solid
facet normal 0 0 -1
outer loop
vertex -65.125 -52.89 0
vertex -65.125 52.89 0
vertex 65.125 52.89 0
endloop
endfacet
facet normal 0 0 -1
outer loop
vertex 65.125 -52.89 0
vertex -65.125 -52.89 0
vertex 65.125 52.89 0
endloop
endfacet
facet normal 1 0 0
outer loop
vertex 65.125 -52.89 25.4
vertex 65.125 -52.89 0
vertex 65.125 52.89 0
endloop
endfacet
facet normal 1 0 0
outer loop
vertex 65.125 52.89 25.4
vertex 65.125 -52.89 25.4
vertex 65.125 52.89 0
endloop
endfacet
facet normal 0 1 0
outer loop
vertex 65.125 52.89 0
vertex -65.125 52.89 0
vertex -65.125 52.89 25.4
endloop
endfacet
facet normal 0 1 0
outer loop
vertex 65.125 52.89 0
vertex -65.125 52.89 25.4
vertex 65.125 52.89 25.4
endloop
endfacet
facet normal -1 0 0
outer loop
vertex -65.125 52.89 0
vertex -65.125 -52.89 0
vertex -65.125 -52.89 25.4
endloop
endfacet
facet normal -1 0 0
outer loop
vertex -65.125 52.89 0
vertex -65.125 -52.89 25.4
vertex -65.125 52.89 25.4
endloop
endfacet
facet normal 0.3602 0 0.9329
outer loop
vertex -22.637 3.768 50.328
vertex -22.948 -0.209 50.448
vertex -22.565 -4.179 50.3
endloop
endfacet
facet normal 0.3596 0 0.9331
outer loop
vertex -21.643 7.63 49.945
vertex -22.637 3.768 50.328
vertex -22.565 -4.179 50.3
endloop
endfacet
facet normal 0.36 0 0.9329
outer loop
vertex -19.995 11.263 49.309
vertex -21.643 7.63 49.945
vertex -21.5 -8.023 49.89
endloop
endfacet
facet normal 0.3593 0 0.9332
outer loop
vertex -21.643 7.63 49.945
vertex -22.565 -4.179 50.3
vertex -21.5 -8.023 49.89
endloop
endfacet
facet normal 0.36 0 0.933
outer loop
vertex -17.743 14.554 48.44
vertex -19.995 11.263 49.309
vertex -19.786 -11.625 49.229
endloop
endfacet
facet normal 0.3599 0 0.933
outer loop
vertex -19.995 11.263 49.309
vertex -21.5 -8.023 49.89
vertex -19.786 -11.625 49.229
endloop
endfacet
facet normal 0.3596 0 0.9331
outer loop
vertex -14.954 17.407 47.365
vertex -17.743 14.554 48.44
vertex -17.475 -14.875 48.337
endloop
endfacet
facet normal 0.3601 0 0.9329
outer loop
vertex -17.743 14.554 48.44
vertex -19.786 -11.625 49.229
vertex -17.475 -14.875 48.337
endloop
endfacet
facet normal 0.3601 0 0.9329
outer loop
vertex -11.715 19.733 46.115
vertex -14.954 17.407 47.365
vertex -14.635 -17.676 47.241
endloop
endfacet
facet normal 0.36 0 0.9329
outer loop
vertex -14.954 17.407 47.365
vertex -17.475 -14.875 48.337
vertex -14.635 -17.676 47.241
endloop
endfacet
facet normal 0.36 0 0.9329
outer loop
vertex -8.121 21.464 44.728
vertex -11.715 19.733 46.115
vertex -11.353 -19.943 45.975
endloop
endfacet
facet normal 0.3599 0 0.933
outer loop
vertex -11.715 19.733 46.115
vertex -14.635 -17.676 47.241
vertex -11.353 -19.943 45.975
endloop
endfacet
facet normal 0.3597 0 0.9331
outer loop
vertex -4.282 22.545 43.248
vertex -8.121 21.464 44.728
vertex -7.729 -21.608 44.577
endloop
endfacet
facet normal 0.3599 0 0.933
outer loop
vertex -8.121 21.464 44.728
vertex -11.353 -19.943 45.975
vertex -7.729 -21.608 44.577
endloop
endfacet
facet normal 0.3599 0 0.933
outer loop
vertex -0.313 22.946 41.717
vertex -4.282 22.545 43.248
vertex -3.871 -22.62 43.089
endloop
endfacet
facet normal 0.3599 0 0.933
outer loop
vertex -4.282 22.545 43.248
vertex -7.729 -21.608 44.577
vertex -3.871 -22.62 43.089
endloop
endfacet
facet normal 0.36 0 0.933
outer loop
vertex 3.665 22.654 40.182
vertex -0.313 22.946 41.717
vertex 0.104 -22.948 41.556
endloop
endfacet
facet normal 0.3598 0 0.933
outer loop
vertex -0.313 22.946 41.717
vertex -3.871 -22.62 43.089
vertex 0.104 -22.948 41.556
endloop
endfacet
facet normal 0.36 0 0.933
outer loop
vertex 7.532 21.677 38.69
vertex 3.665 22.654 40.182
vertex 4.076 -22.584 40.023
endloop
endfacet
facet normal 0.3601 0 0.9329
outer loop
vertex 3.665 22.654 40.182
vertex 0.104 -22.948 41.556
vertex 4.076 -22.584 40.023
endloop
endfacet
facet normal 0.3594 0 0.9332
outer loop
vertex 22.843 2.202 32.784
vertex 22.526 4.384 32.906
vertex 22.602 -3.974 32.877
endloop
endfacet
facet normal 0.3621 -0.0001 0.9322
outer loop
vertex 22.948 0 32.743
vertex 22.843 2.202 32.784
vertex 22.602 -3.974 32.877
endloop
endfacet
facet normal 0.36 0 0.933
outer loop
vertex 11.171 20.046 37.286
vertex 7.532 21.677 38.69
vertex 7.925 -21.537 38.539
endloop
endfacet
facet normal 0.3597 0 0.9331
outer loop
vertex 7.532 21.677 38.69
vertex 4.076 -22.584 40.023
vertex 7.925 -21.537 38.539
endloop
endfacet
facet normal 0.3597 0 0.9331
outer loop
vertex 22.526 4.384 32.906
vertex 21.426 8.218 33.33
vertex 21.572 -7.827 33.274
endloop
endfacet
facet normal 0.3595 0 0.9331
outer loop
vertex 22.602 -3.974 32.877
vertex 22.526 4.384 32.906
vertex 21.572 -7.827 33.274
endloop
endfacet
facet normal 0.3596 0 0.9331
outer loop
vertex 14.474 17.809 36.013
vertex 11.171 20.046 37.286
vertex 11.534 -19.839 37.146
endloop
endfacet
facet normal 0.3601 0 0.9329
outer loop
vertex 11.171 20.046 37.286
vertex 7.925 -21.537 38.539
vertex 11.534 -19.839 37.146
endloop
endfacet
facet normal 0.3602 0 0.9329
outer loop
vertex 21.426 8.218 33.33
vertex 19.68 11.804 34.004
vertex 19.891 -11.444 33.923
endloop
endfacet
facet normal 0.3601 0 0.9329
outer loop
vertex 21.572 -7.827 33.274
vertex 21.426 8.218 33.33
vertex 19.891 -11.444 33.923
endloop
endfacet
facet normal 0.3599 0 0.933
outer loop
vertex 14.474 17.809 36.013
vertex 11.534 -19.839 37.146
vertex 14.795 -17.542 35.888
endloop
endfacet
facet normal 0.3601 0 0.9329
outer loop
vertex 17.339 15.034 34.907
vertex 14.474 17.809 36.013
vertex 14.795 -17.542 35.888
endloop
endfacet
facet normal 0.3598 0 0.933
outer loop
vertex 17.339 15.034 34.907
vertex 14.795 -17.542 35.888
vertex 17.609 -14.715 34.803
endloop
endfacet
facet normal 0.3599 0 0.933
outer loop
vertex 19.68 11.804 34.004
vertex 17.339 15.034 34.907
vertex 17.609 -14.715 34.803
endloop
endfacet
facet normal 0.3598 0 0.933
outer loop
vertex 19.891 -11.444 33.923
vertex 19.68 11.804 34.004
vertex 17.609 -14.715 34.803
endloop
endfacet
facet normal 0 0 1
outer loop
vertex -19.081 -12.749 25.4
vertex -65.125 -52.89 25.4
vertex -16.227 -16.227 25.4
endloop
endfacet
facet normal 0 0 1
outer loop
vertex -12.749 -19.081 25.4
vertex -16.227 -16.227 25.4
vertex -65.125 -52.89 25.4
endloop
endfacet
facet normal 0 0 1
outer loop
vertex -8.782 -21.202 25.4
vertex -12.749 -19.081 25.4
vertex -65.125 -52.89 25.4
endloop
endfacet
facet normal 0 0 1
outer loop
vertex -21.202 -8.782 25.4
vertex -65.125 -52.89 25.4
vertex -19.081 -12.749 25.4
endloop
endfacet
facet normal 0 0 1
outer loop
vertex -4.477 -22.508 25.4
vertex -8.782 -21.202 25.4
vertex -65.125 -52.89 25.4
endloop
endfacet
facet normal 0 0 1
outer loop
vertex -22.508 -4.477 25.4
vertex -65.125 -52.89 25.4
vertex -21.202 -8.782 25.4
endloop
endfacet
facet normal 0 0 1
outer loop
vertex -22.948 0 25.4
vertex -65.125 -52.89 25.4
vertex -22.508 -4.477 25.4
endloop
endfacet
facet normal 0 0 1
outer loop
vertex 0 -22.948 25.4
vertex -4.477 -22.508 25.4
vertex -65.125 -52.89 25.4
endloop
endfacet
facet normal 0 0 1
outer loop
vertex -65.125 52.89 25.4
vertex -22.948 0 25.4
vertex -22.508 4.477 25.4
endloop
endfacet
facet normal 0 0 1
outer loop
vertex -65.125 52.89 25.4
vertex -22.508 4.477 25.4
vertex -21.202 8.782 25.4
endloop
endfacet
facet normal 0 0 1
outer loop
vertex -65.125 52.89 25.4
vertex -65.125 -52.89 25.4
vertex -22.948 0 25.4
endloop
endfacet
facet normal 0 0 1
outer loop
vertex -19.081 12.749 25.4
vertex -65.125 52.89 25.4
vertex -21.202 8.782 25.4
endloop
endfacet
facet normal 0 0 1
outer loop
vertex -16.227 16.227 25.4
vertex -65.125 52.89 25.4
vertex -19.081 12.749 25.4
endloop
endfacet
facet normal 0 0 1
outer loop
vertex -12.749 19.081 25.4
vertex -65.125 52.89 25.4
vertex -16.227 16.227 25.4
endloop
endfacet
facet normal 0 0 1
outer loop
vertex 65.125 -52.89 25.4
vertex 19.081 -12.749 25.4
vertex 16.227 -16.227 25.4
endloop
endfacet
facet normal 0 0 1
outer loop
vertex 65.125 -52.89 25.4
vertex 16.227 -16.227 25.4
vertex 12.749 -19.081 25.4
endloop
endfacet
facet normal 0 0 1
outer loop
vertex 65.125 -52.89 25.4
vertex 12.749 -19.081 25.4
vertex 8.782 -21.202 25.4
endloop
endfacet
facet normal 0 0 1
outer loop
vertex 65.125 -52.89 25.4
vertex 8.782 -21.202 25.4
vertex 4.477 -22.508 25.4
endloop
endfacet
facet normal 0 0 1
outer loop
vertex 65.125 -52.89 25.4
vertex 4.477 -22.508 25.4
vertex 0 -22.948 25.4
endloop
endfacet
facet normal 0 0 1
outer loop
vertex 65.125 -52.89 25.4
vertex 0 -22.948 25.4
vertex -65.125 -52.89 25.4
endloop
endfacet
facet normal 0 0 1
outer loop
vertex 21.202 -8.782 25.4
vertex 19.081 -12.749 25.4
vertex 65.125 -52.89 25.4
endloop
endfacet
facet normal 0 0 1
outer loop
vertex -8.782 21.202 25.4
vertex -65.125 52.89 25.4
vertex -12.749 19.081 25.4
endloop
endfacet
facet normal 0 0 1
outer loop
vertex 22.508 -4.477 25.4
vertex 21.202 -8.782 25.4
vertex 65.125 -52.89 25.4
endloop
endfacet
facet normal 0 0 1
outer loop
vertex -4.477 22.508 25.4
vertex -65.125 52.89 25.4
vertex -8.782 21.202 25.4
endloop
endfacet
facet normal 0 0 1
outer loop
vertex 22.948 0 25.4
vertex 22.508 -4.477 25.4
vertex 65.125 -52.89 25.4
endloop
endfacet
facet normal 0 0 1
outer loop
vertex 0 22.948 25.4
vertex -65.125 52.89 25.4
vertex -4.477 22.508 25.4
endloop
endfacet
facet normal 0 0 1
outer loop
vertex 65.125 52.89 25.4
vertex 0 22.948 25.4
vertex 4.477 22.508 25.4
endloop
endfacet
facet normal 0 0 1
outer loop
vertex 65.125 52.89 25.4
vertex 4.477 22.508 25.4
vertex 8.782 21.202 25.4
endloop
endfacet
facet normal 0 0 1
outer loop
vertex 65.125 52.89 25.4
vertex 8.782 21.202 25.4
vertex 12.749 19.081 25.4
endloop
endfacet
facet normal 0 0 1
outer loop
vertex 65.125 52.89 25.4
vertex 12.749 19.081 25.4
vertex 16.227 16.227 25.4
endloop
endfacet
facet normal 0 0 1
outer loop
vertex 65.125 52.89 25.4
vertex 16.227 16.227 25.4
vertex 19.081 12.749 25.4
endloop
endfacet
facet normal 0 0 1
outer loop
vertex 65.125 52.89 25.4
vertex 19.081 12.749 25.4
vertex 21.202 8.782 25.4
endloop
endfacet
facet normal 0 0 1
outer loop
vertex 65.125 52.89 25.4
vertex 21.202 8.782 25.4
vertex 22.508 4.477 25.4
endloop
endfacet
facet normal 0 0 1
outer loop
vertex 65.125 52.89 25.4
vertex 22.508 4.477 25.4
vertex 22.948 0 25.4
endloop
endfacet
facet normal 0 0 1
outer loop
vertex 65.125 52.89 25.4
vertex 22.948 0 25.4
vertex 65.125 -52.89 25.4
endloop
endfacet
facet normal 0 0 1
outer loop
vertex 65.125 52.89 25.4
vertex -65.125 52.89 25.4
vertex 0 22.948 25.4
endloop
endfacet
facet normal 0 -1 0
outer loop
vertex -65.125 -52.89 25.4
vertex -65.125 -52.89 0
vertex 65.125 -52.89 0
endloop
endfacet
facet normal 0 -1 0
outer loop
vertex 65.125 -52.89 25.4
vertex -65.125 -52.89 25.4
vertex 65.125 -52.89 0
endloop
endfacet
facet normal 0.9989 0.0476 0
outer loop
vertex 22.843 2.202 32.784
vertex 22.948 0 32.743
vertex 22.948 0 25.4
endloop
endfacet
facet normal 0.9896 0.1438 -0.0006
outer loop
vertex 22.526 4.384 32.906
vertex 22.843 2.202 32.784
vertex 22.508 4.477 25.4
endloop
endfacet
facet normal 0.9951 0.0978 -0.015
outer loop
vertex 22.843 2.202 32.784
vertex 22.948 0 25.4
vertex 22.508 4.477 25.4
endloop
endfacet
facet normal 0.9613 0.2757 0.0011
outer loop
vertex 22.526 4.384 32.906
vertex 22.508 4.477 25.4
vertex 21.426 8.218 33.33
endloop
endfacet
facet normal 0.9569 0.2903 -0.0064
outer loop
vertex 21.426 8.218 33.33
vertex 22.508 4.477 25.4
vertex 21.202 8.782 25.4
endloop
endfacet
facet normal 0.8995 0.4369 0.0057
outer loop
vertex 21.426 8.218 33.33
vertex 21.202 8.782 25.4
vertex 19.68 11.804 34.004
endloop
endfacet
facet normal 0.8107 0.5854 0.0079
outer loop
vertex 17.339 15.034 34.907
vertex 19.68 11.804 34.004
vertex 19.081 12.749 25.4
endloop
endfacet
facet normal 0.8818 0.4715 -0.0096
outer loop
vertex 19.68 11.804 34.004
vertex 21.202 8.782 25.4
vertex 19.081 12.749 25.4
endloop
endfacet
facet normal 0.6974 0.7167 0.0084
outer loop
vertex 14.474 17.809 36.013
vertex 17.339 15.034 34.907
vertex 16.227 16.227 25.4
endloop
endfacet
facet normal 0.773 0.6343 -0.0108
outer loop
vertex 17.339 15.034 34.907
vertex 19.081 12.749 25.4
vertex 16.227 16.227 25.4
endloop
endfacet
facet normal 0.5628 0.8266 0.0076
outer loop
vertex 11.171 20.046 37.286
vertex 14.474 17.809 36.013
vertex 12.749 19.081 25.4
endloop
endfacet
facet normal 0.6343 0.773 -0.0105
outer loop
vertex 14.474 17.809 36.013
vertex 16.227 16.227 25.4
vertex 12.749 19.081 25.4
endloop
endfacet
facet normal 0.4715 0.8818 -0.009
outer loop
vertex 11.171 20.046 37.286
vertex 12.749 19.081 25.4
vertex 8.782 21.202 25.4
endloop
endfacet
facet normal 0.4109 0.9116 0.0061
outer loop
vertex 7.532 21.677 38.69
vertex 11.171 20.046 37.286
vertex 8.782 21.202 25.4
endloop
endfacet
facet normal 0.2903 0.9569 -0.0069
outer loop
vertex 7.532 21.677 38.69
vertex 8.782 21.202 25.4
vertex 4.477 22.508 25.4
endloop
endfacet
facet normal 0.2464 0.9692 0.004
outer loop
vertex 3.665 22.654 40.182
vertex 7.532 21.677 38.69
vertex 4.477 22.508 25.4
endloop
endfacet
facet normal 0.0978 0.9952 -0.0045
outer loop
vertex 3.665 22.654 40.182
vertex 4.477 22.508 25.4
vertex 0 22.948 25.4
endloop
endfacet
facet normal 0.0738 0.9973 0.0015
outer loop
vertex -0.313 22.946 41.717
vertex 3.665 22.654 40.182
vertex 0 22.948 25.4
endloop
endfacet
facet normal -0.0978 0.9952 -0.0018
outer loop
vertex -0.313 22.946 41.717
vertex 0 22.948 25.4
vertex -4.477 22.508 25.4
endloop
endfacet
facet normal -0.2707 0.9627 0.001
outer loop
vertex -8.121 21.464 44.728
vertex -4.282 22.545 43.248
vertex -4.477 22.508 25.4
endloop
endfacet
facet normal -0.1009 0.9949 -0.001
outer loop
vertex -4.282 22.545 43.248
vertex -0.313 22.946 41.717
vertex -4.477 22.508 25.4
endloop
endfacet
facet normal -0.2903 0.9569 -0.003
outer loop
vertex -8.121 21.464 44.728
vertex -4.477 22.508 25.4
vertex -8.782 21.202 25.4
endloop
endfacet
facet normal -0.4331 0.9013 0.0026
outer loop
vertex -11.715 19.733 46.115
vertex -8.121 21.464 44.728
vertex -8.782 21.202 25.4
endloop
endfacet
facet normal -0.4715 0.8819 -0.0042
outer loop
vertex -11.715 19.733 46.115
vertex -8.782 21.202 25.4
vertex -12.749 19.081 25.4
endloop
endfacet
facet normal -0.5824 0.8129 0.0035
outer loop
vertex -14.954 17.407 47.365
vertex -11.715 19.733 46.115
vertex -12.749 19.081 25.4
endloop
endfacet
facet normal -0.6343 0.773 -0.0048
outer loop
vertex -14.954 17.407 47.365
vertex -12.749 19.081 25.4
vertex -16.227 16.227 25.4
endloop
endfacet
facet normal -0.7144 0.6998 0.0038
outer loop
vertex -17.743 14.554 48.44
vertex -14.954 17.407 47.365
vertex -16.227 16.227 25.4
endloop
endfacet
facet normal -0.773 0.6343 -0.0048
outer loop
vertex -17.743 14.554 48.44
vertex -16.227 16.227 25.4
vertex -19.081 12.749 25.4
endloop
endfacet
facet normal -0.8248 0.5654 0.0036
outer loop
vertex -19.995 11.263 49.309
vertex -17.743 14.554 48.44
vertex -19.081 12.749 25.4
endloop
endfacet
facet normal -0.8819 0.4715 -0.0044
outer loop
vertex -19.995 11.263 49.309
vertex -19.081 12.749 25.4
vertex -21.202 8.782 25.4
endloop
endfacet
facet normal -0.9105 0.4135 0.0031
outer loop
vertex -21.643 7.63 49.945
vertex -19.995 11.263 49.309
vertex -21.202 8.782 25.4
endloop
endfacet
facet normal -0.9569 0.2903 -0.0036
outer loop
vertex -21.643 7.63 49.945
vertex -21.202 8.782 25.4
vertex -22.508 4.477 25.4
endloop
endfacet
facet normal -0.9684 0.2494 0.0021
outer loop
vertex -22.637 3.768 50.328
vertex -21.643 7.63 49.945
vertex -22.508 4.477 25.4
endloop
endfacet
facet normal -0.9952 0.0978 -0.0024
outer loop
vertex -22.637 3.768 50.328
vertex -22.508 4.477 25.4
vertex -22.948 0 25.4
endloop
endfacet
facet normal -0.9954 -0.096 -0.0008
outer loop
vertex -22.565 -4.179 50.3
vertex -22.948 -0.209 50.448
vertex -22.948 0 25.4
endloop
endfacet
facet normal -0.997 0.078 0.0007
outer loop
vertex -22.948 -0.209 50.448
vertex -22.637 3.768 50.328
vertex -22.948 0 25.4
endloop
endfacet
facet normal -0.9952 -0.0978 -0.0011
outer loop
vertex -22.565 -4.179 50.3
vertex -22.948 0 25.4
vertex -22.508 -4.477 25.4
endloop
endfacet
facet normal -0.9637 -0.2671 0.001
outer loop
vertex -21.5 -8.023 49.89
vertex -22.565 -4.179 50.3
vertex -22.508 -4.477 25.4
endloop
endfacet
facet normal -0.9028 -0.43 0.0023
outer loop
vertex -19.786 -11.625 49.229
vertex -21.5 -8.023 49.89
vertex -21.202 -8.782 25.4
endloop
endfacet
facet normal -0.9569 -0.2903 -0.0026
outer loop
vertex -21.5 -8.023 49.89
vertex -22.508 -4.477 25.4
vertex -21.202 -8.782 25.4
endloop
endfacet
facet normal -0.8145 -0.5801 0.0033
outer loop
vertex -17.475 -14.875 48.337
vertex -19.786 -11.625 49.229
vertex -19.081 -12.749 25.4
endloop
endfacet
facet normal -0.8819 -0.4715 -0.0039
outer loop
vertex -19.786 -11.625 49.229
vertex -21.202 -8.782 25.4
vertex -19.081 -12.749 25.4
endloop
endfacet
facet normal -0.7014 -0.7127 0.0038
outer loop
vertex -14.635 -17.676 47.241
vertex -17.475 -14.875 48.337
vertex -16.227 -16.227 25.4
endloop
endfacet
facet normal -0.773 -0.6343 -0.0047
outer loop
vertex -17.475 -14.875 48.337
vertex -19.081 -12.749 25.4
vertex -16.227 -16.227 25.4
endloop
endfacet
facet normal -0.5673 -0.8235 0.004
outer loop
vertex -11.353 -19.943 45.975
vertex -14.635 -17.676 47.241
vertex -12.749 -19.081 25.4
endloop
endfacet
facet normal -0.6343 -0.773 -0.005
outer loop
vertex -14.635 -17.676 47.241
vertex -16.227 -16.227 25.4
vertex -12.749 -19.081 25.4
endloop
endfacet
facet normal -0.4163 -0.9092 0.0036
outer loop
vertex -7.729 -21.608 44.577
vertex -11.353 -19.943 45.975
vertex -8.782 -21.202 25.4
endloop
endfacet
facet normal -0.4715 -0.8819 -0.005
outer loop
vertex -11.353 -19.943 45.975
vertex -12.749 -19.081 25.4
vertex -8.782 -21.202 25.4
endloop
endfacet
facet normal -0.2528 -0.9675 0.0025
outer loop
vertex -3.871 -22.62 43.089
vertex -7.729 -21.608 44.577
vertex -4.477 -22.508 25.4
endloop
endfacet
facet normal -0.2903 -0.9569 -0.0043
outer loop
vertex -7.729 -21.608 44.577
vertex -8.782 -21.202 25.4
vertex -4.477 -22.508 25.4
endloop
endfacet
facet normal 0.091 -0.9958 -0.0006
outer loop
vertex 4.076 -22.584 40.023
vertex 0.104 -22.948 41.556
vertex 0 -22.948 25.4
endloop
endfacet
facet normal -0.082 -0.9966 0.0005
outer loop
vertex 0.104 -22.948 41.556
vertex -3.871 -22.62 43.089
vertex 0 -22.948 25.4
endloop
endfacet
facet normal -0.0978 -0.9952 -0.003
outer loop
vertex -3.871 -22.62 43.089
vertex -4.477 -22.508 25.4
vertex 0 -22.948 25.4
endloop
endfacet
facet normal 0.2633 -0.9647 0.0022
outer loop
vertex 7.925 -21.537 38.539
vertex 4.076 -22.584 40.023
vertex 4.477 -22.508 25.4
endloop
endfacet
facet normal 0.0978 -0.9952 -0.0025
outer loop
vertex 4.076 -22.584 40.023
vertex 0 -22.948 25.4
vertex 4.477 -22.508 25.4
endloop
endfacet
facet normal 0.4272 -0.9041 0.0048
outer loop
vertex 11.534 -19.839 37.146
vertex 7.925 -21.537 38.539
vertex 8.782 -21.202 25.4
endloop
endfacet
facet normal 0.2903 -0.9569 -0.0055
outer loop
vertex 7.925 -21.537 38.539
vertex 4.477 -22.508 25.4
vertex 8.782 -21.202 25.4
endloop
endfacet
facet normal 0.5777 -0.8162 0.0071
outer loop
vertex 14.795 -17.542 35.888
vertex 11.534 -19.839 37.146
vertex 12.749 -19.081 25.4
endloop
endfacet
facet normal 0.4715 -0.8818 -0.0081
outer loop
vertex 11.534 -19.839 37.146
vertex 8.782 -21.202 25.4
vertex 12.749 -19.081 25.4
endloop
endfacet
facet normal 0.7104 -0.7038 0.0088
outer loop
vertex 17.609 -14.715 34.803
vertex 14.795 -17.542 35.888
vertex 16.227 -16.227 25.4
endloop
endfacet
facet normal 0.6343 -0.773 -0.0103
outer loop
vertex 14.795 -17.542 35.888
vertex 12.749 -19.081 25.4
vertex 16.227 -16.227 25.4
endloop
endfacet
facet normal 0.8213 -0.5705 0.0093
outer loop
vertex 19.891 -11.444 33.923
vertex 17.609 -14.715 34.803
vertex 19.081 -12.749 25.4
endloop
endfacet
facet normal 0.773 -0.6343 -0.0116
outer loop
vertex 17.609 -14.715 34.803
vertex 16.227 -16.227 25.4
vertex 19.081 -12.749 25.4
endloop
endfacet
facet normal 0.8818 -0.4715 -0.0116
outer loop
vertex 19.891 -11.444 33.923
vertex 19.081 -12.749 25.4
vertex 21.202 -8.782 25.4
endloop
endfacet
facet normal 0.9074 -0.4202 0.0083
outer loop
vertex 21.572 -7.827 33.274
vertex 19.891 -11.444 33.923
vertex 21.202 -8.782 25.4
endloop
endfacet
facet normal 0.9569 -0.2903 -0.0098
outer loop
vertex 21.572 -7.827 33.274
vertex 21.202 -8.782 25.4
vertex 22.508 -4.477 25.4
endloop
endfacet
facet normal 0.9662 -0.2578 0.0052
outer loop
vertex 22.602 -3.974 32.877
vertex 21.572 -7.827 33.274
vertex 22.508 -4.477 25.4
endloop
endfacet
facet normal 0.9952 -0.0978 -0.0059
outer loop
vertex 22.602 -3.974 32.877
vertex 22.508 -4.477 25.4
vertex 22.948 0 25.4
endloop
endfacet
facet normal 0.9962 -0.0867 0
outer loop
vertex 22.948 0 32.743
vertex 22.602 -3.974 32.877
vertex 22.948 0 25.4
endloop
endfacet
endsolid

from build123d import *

# Parameters (mm, degrees)
F0_R     = 22.948461
F1_DEPTH = 50.8
F2_W     = 130.250856
F2_H     = 105.779626
F3_DEPTH = 25.4
F5_DEPTH = 127


with BuildPart() as f1:
    # F0 (on Top) → F1 (new body)
    with BuildSketch(Plane.XY):
        Circle(F0_R)
    extrude(amount=F1_DEPTH)

    # F2 (on Top) → F3 (join)
    with BuildSketch(Plane.XY):
        Rectangle(F2_W, F2_H)
    extrude(amount=F3_DEPTH)

    # F4 (on Front) → F5 (cut, symmetric)
    with BuildSketch(Plane.XZ):
        Polygon((31.802371, 53.156704), (-29.969381, 53.156704), (31.802371, 29.327836), (33.301385, 50.980239), (33.452064, 53.156704), align=None)
    extrude(amount=F5_DEPTH, both=True, mode=Mode.SUBTRACT)


solid = f1.part
